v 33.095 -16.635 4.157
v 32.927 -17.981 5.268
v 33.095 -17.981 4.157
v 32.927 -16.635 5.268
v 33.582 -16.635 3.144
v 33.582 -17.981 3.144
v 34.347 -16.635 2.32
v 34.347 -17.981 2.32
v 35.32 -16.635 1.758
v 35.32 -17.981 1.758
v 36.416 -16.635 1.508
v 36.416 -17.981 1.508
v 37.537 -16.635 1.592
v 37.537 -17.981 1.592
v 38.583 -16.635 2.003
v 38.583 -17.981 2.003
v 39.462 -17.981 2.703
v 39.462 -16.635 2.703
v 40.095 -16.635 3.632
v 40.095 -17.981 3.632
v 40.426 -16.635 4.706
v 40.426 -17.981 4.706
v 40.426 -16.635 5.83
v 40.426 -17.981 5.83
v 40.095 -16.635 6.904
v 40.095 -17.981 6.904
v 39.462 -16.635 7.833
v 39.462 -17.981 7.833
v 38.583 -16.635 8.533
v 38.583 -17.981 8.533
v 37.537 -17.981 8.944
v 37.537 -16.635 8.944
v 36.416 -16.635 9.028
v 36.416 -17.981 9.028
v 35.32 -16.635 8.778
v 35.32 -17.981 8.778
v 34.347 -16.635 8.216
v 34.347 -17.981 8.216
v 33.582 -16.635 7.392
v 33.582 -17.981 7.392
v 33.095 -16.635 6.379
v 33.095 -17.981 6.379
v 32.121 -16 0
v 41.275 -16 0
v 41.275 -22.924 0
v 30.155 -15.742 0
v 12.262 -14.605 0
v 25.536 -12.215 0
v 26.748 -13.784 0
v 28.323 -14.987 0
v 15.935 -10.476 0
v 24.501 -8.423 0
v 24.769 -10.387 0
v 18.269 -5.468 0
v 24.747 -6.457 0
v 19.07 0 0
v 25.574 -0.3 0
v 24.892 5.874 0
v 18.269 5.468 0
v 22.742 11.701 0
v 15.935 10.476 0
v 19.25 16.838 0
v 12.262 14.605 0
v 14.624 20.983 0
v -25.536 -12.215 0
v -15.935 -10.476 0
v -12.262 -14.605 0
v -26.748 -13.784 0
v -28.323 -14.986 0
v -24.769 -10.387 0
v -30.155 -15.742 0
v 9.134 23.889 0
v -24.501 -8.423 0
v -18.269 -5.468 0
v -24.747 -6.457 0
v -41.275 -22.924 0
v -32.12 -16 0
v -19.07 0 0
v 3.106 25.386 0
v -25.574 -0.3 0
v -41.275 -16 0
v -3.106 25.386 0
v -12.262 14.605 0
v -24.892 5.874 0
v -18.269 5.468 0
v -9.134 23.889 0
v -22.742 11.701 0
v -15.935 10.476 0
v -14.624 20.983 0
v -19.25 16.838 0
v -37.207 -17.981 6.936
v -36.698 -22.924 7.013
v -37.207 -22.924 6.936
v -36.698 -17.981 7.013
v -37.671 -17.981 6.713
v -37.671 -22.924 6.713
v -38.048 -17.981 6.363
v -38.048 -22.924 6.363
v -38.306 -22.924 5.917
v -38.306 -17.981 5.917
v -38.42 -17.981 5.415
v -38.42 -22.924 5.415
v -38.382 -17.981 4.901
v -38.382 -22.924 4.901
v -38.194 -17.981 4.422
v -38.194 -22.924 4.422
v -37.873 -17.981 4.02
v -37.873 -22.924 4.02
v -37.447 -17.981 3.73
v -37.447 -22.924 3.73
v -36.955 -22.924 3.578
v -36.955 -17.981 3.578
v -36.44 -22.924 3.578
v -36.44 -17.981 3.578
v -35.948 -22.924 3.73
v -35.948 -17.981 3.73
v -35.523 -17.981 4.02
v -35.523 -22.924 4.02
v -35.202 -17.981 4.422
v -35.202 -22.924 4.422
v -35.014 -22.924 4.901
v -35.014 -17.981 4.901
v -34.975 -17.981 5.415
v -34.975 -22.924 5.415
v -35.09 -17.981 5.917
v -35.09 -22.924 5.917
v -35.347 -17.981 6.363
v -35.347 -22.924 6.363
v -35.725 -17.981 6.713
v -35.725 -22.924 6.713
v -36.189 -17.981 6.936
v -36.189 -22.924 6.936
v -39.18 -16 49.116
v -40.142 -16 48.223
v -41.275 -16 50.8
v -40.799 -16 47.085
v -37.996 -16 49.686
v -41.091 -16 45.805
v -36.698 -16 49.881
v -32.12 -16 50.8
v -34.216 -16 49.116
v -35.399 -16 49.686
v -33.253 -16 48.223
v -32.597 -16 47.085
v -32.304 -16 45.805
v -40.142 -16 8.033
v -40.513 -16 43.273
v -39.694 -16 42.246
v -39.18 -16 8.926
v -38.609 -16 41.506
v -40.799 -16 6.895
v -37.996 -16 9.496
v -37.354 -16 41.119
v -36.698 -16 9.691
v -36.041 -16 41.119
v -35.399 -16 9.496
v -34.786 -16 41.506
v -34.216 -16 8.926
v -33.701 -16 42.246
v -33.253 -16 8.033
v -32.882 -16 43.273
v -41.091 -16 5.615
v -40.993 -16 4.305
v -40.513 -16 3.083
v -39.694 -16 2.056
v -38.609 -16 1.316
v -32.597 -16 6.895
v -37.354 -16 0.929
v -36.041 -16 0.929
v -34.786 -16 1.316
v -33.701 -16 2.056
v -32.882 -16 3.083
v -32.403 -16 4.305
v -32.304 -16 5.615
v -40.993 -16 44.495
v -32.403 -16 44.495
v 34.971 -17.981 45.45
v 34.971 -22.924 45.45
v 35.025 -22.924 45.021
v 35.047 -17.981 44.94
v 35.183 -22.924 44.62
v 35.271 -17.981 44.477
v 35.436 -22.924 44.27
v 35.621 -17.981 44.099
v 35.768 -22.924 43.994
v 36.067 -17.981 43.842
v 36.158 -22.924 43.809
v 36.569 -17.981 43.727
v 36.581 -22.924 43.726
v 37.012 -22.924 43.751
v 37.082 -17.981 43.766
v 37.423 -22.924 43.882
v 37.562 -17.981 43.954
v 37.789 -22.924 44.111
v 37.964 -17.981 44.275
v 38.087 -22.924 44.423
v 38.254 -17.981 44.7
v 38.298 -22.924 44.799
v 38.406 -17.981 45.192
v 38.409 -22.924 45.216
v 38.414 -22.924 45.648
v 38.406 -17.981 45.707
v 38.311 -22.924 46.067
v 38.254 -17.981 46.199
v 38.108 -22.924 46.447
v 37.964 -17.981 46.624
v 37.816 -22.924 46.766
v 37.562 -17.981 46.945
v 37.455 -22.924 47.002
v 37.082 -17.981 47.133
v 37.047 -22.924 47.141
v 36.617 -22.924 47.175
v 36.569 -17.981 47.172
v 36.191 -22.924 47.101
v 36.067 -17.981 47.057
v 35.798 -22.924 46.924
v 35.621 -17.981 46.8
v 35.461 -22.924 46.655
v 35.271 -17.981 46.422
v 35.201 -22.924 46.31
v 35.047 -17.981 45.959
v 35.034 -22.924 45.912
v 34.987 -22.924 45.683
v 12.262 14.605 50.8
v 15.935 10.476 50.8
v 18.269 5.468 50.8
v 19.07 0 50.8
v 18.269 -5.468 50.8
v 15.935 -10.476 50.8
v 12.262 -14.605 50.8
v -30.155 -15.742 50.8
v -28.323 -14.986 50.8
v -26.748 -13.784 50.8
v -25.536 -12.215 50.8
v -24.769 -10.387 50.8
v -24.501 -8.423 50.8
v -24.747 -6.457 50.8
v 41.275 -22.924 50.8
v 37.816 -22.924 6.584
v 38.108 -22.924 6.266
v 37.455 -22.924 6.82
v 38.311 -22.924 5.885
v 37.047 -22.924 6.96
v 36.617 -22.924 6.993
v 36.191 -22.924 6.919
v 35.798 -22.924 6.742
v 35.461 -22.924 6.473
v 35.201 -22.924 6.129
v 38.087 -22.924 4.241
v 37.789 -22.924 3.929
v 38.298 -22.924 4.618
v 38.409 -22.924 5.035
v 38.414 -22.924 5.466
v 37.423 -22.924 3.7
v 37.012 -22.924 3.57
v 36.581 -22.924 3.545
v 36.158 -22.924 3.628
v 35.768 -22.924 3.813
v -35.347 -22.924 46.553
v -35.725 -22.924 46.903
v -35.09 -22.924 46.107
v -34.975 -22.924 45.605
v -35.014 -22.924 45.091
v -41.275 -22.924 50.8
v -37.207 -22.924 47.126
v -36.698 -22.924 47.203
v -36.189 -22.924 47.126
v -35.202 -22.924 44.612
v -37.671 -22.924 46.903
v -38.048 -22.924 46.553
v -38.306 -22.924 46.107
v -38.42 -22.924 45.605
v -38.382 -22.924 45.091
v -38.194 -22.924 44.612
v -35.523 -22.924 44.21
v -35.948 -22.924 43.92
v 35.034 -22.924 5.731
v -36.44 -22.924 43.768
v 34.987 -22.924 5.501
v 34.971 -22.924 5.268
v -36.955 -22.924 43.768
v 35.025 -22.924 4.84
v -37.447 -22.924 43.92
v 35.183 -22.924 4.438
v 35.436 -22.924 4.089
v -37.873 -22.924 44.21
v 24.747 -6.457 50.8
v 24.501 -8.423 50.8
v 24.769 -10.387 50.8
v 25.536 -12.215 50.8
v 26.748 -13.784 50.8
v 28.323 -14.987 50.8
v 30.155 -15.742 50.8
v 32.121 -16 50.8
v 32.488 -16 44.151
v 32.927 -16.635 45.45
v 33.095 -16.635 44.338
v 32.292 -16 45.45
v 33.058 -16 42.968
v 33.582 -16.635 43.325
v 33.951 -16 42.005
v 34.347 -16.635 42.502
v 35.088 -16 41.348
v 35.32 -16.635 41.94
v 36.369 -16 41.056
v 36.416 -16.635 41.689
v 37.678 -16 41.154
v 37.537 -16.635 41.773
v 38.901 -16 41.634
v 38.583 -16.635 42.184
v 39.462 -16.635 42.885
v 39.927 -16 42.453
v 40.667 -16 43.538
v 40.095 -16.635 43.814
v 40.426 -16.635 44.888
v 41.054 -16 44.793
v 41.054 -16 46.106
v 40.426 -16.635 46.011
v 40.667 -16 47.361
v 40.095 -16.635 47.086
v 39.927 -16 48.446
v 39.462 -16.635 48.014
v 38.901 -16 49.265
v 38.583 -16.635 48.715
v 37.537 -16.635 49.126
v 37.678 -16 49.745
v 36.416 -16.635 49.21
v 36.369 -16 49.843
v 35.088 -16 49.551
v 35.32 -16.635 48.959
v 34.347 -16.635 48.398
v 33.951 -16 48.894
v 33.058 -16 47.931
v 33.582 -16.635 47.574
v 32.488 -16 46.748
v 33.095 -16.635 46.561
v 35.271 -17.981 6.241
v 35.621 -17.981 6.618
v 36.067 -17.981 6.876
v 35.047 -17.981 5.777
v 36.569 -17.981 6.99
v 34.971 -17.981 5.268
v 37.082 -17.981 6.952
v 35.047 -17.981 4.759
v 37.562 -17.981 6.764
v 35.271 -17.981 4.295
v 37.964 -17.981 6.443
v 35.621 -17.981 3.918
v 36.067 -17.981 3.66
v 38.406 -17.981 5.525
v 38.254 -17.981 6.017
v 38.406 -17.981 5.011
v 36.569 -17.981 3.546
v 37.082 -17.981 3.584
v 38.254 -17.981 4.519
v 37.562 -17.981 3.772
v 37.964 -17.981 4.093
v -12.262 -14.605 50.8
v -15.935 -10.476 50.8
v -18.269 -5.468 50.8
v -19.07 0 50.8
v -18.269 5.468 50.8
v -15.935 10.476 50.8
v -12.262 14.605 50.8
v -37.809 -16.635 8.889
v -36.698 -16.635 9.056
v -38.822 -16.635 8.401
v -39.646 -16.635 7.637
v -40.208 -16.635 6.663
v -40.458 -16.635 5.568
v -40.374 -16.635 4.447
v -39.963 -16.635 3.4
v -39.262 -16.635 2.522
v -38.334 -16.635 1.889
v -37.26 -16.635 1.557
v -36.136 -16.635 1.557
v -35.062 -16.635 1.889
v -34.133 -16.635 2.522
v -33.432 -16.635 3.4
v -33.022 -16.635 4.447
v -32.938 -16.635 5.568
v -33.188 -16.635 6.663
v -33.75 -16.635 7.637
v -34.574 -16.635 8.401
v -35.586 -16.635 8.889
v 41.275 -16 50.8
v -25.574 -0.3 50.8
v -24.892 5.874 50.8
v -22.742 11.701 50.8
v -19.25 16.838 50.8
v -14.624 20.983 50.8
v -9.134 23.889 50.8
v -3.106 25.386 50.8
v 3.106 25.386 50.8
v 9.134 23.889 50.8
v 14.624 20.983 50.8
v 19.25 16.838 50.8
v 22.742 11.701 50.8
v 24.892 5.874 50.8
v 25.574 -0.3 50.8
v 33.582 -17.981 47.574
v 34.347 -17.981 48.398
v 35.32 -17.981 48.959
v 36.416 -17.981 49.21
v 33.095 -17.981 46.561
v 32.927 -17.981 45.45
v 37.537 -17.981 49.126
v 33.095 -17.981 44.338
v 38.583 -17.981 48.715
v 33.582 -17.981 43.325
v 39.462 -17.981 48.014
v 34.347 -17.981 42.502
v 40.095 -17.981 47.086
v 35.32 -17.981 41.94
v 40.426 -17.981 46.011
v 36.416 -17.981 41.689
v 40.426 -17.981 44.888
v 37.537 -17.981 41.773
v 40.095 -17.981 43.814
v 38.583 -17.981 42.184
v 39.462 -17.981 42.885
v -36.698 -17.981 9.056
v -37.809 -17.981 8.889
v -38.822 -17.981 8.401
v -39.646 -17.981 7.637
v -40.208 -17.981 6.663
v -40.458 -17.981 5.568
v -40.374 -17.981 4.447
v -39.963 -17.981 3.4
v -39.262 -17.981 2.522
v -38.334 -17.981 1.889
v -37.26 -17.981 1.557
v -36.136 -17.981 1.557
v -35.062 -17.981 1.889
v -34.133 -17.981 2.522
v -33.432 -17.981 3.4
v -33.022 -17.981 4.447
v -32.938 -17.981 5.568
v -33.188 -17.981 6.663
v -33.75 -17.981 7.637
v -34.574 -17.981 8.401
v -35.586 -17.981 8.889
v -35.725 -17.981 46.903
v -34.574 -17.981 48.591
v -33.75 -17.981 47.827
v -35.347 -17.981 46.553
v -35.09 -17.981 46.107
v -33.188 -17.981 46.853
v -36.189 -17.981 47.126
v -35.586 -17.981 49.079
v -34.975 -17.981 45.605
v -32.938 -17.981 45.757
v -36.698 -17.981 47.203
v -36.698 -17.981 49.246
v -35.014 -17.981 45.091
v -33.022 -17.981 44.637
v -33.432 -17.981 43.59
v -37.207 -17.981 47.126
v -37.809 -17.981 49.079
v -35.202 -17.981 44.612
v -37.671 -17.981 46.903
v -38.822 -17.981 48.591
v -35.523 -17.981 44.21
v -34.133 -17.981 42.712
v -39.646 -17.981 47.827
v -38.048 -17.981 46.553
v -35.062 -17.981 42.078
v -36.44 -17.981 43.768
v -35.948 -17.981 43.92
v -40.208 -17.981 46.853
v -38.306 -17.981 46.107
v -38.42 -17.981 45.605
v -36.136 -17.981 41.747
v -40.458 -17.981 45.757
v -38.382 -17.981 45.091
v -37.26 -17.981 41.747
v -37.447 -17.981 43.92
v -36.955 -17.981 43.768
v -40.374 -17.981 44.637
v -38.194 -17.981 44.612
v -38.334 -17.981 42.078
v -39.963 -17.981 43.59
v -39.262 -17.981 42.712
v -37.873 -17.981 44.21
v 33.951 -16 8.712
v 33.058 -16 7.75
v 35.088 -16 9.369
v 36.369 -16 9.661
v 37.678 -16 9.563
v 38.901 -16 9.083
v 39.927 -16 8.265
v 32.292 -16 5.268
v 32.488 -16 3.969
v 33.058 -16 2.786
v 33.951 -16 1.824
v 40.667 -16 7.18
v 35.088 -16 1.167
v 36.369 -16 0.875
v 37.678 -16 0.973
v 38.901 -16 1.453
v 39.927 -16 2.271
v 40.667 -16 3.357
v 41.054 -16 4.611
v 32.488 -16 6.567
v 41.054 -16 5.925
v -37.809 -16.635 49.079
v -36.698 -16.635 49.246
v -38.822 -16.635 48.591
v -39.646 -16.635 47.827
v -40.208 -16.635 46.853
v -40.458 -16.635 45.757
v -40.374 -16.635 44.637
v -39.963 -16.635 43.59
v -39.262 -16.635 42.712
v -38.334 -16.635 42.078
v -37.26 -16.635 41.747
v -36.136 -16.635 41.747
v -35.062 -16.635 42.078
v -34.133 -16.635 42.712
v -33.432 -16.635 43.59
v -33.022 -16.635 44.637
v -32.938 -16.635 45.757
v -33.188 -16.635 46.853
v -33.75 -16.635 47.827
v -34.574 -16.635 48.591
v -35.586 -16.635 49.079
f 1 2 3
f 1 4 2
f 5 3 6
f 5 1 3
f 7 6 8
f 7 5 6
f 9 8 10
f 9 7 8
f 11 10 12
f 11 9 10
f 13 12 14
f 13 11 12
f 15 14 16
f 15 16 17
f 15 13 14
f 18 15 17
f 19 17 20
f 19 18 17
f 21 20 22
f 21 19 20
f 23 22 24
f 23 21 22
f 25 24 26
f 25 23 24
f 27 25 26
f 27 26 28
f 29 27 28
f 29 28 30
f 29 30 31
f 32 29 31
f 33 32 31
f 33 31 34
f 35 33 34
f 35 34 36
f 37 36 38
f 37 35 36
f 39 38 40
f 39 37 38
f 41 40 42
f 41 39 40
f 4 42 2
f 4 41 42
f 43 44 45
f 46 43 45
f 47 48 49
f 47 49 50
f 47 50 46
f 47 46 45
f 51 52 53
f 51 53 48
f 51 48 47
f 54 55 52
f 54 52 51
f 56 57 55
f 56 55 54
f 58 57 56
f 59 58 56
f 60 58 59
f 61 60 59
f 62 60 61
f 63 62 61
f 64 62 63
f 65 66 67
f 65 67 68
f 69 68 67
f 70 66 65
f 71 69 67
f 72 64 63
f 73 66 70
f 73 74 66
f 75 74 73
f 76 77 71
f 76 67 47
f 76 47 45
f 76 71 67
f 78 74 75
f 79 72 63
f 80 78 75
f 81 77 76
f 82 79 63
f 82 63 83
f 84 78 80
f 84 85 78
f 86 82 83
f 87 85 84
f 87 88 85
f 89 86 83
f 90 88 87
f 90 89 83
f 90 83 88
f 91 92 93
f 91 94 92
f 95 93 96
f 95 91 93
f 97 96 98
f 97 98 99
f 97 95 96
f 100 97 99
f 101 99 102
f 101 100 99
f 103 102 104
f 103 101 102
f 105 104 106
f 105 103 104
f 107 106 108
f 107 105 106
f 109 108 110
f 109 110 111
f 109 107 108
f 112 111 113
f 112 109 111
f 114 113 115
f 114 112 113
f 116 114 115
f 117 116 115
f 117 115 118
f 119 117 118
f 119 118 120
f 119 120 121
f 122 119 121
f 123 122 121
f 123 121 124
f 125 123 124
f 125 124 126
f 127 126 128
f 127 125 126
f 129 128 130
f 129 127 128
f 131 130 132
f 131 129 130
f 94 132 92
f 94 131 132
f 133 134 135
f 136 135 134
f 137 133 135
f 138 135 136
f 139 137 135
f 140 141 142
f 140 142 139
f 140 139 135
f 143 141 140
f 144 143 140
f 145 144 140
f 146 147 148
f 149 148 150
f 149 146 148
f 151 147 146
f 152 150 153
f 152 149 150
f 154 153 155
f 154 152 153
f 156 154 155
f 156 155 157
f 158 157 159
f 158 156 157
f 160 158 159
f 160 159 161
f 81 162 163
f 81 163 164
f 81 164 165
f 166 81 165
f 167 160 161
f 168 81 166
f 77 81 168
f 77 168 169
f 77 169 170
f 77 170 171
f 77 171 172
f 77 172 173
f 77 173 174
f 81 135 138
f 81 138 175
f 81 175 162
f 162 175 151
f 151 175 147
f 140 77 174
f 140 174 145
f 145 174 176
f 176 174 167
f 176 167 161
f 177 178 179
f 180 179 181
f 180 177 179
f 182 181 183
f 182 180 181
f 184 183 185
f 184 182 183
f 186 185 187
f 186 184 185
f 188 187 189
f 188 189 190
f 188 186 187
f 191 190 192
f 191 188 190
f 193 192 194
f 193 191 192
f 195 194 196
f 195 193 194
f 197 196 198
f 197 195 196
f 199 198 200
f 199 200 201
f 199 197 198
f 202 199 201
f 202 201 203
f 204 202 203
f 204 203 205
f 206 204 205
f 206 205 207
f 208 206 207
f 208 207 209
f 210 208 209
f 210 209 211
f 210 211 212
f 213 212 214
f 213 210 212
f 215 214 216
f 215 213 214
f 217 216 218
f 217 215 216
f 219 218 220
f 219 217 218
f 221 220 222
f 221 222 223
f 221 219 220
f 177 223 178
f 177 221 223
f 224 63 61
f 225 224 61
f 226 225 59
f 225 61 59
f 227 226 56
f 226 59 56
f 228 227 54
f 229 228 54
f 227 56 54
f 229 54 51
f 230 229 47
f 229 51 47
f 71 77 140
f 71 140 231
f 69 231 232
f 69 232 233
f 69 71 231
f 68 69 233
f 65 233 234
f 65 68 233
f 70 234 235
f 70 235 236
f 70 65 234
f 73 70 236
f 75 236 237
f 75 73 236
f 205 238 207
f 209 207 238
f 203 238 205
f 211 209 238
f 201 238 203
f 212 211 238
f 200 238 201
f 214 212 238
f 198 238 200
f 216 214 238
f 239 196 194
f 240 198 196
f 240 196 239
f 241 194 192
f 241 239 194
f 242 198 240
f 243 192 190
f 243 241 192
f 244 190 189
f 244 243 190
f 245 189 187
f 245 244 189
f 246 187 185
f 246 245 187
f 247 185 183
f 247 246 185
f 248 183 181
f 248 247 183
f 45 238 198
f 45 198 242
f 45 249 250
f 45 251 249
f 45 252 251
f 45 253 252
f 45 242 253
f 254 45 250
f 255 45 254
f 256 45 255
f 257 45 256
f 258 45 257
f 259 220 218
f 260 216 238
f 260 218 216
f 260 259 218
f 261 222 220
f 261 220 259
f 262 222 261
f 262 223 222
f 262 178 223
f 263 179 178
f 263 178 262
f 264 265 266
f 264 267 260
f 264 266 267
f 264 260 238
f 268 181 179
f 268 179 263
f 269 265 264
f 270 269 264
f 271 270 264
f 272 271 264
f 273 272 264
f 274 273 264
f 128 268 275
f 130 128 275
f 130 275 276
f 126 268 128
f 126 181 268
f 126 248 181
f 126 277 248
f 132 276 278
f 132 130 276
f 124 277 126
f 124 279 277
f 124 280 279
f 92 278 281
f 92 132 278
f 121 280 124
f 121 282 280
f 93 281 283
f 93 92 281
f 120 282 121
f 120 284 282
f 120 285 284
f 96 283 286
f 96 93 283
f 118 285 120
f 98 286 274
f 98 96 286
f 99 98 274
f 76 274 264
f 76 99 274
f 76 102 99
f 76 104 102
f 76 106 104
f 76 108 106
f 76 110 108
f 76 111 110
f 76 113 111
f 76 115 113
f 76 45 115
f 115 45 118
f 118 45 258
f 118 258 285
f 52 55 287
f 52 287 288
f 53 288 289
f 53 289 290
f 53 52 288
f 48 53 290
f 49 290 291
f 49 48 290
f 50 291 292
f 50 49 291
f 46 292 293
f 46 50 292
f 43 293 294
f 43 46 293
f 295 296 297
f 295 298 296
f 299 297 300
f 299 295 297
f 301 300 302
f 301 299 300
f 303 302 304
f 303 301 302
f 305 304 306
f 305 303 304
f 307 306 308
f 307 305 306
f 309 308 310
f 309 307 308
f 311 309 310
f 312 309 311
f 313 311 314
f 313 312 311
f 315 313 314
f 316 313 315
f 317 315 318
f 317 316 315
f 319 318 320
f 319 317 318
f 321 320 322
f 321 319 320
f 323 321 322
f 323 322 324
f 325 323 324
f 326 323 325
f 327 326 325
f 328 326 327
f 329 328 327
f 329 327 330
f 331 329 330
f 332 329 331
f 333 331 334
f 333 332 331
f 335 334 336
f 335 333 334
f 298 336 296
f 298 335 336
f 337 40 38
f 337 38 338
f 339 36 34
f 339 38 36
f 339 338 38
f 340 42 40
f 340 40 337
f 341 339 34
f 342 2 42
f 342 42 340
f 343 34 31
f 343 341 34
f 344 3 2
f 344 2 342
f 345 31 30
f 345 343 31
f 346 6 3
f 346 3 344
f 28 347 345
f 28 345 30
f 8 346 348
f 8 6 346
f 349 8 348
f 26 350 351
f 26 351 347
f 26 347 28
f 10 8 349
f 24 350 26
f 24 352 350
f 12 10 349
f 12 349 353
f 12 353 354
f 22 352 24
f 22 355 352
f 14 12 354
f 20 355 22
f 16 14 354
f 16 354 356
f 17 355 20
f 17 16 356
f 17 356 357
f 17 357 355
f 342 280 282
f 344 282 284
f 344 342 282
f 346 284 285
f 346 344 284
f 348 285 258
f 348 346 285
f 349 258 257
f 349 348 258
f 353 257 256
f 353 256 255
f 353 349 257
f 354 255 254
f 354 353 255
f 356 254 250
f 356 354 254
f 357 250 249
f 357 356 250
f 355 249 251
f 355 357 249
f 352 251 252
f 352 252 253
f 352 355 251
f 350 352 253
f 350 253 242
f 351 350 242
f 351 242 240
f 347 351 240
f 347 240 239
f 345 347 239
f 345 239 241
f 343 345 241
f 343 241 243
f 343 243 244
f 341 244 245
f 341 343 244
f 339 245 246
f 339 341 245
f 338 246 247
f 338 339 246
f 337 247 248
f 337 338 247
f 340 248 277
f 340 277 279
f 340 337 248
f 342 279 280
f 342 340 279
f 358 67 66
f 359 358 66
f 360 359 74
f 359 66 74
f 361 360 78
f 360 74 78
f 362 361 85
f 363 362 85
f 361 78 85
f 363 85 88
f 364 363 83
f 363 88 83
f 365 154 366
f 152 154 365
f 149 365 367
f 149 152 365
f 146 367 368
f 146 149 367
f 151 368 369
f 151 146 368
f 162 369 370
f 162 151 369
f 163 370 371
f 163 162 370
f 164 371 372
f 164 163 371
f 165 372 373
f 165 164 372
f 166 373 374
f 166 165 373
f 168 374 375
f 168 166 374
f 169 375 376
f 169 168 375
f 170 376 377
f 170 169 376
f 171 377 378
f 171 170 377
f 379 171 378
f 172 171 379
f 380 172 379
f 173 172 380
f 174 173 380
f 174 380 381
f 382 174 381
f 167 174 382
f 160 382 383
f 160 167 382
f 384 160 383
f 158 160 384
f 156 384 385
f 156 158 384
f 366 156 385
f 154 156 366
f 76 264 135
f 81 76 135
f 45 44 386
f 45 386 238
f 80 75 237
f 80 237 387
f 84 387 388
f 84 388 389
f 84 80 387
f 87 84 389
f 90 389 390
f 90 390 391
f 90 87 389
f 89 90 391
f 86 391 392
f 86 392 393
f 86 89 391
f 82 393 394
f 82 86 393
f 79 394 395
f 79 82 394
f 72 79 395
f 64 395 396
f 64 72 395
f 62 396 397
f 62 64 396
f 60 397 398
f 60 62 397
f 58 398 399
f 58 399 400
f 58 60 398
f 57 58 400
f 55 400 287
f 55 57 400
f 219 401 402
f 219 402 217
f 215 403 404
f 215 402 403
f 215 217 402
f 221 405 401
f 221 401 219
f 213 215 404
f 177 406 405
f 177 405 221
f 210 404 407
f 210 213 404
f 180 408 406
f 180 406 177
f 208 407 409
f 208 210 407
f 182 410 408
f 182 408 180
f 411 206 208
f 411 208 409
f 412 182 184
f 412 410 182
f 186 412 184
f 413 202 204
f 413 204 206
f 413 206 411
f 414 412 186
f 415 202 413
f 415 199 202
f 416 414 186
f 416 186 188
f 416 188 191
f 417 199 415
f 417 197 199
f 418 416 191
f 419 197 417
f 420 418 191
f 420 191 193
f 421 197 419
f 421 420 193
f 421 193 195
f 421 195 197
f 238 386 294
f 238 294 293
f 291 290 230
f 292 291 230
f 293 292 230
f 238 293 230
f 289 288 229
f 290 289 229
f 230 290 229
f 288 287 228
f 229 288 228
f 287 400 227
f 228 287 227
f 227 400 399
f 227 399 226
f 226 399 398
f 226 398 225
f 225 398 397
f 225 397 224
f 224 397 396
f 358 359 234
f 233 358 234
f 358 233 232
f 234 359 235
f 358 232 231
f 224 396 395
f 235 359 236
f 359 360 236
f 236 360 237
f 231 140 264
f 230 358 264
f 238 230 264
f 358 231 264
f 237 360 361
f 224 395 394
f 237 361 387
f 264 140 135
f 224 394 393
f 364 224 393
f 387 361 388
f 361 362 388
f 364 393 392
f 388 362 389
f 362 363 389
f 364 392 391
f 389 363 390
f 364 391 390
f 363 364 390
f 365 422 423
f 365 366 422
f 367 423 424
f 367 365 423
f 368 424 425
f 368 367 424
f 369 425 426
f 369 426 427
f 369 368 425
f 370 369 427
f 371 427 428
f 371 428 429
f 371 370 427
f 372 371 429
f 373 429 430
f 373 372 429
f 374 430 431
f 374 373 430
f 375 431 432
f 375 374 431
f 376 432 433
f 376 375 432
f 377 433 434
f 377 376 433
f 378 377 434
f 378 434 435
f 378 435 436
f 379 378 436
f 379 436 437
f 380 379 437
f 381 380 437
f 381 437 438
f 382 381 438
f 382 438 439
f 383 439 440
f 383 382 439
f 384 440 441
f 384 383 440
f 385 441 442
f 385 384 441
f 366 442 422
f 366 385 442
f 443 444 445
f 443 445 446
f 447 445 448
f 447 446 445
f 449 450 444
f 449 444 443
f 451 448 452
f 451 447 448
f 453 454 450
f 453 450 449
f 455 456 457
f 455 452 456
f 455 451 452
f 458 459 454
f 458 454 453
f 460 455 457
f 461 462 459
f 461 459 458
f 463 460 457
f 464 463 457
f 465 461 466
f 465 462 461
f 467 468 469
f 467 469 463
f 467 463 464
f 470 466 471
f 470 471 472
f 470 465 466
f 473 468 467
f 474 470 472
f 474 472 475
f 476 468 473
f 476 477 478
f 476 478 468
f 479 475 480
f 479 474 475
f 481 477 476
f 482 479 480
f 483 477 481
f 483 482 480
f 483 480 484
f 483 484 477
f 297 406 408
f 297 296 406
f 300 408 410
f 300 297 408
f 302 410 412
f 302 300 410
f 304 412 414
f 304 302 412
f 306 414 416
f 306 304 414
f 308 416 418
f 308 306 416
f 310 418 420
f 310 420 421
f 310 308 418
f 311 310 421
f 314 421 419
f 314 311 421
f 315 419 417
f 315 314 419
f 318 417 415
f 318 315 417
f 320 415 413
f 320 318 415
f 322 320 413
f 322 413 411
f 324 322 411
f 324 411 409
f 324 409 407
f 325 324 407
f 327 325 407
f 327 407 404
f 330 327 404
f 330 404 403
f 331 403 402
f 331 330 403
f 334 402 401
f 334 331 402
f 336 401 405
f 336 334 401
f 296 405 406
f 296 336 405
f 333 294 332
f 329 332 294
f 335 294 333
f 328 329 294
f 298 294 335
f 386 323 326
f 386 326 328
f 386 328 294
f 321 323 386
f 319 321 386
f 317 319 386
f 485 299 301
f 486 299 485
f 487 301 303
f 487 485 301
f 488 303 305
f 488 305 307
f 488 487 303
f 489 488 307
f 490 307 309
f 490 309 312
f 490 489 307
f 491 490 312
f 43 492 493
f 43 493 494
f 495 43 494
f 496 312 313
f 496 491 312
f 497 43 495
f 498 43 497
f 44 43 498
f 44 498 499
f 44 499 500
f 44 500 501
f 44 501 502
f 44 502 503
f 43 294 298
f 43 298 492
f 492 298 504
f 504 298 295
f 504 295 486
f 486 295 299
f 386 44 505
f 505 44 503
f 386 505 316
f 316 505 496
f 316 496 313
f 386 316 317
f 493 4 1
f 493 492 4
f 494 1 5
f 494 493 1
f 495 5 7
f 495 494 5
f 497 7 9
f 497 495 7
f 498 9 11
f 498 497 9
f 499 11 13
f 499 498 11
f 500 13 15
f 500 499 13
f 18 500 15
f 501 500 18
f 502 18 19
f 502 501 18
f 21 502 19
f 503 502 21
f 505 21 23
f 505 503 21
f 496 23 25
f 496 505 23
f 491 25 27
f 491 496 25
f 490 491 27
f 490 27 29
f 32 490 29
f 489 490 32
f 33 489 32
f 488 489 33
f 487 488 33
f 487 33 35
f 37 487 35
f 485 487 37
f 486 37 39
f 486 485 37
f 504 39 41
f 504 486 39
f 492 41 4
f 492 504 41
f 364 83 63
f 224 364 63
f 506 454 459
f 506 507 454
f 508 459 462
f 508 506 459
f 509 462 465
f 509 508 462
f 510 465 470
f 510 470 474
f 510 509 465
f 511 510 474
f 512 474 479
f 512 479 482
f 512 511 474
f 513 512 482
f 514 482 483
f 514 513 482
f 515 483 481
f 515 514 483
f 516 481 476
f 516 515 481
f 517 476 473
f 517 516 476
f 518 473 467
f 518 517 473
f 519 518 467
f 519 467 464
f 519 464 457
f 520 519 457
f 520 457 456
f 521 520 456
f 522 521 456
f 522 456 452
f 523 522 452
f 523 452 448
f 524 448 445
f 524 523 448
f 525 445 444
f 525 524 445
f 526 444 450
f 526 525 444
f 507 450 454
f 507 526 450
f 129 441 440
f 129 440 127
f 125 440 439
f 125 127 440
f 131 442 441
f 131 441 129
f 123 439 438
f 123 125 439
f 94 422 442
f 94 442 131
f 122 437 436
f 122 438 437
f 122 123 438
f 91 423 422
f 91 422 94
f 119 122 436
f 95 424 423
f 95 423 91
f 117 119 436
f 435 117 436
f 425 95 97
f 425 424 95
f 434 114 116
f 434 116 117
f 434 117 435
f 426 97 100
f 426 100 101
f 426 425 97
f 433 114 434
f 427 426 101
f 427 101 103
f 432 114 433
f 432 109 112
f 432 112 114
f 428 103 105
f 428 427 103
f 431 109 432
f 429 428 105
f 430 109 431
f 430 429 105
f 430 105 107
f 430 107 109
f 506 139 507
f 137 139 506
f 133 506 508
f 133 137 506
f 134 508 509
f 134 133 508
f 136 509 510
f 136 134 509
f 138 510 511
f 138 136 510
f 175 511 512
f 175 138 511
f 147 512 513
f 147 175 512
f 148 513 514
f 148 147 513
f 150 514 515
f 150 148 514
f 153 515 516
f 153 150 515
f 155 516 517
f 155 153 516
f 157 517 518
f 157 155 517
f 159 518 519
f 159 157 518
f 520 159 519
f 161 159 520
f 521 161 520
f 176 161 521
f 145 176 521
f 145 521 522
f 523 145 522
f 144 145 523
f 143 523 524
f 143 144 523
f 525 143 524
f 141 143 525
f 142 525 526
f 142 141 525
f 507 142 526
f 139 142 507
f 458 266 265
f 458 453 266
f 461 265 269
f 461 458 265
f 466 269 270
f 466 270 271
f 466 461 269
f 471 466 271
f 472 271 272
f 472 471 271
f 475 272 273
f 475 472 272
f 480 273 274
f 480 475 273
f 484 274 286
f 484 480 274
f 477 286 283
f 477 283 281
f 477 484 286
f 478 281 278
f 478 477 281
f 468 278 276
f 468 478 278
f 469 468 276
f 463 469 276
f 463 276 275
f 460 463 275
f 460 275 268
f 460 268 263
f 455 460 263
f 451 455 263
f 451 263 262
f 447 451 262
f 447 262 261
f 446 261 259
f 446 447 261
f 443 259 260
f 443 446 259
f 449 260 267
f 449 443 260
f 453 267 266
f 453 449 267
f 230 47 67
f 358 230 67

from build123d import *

# Parameters (mm, degrees)
BOSS_EXTRUDE1_DEPTH                         = 50.8
CBORE_FOR_5_BINDING_HEAD_MACHINE_SC_2_COUNT = 2
CBORE_FOR_5_BINDING_HEAD_MACHINE_SC_2_PITCH = 40.189879992
CBORE_FOR_5_BINDING_HEAD_MACHINE_SC_3_COUNT = 2
CBORE_FOR_5_BINDING_HEAD_MACHINE_SC_3_PITCH = 40.181482417


with BuildPart() as part:
    # Sketch1 → Boss-Extrude1 (new body)
    with BuildSketch(Plane.XY):
        with BuildLine():
            Line((41.275, -15.999909517), (41.275, -22.9235))
            Line((41.275, -22.9235), (-41.275, -22.9235))
            Line((-41.275, -22.9235), (-41.275, -16.00020267))
            Line((-41.275, -16.00020267), (-32.120446577, -16.00020267))
            ThreePointArc((-32.120446577, -16.00020267), (-26.090409627, -13.03885638), (-24.747256549, -6.456542406))
            ThreePointArc((-24.747256549, -6.456542406), (0, 25.575645574), (24.747256549, -6.456542406))
            ThreePointArc((24.747256549, -6.456542406), (26.09048422, -13.03895293), (32.120690592, -16.000202666))
            Line((32.120690592, -16.000202666), (41.275, -15.999909517))
        make_face()
        with BuildLine():
            Line((0, 14.605), (12.262196034, 14.605))
            ThreePointArc((12.262196034, 14.605), (19.070067555, 0), (12.262196034, -14.605))
            Line((12.262196034, -14.605), (0, -14.605))
            Line((0, -14.605), (-12.262196034, -14.605))
            ThreePointArc((-12.262196034, -14.605), (-19.070067555, 0), (-12.262196034, 14.605))
            Line((-12.262196034, 14.605), (0, 14.605))
        make_face(mode=Mode.SUBTRACT)
    extrude(amount=BOSS_EXTRUDE1_DEPTH)

    # Sketch6 → CBORE for #5 Binding Head Machine Screw1 (revolve, cut)
    with BuildSketch(Plane(origin=(-36.697723288, -16.00020267, 5.28577815), x_dir=(0, 0, 1), z_dir=(1, 0, 0))):
        Polygon((0, 0), (0, 6.92329733), (1.7272, 6.92329733), (1.7272, 1.9812), (3.77063, 1.9812), (3.77063, 0.635), (4.40563, 0), align=None)
    cbore_for_5_binding_head_machine_screw1 = revolve(axis=Axis((-36.697723288, -9.65020267, 5.28577815), (0, -1, 0)), mode=Mode.SUBTRACT)

    # CBORE for _5 Binding Head Machine Sc 2: CBORE for #5 Binding Head Machine Screw1 ×2
    with Locations(*[(0, 0, i * CBORE_FOR_5_BINDING_HEAD_MACHINE_SC_2_PITCH) for i in range(1, CBORE_FOR_5_BINDING_HEAD_MACHINE_SC_2_COUNT)]):
        add(cbore_for_5_binding_head_machine_screw1, mode=Mode.SUBTRACT)

    # Sketch8 → CBORE for #5 Binding Head Machine Screw2 (revolve, cut)
    with BuildSketch(Plane(origin=(36.697845296, -16.000056092, 5.268033609), x_dir=(-0.9999999994872624, -3.2023045840411235e-05, 0), z_dir=(0, 0, 1))):
        Polygon((0, 0), (0, 6.923590479), (1.7272, 6.923590479), (1.7272, 1.9812), (3.77063, 1.9812), (3.77063, 0.635), (4.40563, 0), align=None)
    cbore_for_5_binding_head_machine_screw2 = revolve(axis=Axis((36.69764195, -9.650056095, 5.268033609), (3.20230458404138e-05, -0.9999999994872623, 0)), mode=Mode.SUBTRACT)

    # CBORE for _5 Binding Head Machine Sc 3: CBORE for #5 Binding Head Machine Screw2 ×2
    with Locations(*[(0, 0, i * CBORE_FOR_5_BINDING_HEAD_MACHINE_SC_3_PITCH) for i in range(1, CBORE_FOR_5_BINDING_HEAD_MACHINE_SC_3_COUNT)]):
        add(cbore_for_5_binding_head_machine_screw2, mode=Mode.SUBTRACT)


solid = part.part
